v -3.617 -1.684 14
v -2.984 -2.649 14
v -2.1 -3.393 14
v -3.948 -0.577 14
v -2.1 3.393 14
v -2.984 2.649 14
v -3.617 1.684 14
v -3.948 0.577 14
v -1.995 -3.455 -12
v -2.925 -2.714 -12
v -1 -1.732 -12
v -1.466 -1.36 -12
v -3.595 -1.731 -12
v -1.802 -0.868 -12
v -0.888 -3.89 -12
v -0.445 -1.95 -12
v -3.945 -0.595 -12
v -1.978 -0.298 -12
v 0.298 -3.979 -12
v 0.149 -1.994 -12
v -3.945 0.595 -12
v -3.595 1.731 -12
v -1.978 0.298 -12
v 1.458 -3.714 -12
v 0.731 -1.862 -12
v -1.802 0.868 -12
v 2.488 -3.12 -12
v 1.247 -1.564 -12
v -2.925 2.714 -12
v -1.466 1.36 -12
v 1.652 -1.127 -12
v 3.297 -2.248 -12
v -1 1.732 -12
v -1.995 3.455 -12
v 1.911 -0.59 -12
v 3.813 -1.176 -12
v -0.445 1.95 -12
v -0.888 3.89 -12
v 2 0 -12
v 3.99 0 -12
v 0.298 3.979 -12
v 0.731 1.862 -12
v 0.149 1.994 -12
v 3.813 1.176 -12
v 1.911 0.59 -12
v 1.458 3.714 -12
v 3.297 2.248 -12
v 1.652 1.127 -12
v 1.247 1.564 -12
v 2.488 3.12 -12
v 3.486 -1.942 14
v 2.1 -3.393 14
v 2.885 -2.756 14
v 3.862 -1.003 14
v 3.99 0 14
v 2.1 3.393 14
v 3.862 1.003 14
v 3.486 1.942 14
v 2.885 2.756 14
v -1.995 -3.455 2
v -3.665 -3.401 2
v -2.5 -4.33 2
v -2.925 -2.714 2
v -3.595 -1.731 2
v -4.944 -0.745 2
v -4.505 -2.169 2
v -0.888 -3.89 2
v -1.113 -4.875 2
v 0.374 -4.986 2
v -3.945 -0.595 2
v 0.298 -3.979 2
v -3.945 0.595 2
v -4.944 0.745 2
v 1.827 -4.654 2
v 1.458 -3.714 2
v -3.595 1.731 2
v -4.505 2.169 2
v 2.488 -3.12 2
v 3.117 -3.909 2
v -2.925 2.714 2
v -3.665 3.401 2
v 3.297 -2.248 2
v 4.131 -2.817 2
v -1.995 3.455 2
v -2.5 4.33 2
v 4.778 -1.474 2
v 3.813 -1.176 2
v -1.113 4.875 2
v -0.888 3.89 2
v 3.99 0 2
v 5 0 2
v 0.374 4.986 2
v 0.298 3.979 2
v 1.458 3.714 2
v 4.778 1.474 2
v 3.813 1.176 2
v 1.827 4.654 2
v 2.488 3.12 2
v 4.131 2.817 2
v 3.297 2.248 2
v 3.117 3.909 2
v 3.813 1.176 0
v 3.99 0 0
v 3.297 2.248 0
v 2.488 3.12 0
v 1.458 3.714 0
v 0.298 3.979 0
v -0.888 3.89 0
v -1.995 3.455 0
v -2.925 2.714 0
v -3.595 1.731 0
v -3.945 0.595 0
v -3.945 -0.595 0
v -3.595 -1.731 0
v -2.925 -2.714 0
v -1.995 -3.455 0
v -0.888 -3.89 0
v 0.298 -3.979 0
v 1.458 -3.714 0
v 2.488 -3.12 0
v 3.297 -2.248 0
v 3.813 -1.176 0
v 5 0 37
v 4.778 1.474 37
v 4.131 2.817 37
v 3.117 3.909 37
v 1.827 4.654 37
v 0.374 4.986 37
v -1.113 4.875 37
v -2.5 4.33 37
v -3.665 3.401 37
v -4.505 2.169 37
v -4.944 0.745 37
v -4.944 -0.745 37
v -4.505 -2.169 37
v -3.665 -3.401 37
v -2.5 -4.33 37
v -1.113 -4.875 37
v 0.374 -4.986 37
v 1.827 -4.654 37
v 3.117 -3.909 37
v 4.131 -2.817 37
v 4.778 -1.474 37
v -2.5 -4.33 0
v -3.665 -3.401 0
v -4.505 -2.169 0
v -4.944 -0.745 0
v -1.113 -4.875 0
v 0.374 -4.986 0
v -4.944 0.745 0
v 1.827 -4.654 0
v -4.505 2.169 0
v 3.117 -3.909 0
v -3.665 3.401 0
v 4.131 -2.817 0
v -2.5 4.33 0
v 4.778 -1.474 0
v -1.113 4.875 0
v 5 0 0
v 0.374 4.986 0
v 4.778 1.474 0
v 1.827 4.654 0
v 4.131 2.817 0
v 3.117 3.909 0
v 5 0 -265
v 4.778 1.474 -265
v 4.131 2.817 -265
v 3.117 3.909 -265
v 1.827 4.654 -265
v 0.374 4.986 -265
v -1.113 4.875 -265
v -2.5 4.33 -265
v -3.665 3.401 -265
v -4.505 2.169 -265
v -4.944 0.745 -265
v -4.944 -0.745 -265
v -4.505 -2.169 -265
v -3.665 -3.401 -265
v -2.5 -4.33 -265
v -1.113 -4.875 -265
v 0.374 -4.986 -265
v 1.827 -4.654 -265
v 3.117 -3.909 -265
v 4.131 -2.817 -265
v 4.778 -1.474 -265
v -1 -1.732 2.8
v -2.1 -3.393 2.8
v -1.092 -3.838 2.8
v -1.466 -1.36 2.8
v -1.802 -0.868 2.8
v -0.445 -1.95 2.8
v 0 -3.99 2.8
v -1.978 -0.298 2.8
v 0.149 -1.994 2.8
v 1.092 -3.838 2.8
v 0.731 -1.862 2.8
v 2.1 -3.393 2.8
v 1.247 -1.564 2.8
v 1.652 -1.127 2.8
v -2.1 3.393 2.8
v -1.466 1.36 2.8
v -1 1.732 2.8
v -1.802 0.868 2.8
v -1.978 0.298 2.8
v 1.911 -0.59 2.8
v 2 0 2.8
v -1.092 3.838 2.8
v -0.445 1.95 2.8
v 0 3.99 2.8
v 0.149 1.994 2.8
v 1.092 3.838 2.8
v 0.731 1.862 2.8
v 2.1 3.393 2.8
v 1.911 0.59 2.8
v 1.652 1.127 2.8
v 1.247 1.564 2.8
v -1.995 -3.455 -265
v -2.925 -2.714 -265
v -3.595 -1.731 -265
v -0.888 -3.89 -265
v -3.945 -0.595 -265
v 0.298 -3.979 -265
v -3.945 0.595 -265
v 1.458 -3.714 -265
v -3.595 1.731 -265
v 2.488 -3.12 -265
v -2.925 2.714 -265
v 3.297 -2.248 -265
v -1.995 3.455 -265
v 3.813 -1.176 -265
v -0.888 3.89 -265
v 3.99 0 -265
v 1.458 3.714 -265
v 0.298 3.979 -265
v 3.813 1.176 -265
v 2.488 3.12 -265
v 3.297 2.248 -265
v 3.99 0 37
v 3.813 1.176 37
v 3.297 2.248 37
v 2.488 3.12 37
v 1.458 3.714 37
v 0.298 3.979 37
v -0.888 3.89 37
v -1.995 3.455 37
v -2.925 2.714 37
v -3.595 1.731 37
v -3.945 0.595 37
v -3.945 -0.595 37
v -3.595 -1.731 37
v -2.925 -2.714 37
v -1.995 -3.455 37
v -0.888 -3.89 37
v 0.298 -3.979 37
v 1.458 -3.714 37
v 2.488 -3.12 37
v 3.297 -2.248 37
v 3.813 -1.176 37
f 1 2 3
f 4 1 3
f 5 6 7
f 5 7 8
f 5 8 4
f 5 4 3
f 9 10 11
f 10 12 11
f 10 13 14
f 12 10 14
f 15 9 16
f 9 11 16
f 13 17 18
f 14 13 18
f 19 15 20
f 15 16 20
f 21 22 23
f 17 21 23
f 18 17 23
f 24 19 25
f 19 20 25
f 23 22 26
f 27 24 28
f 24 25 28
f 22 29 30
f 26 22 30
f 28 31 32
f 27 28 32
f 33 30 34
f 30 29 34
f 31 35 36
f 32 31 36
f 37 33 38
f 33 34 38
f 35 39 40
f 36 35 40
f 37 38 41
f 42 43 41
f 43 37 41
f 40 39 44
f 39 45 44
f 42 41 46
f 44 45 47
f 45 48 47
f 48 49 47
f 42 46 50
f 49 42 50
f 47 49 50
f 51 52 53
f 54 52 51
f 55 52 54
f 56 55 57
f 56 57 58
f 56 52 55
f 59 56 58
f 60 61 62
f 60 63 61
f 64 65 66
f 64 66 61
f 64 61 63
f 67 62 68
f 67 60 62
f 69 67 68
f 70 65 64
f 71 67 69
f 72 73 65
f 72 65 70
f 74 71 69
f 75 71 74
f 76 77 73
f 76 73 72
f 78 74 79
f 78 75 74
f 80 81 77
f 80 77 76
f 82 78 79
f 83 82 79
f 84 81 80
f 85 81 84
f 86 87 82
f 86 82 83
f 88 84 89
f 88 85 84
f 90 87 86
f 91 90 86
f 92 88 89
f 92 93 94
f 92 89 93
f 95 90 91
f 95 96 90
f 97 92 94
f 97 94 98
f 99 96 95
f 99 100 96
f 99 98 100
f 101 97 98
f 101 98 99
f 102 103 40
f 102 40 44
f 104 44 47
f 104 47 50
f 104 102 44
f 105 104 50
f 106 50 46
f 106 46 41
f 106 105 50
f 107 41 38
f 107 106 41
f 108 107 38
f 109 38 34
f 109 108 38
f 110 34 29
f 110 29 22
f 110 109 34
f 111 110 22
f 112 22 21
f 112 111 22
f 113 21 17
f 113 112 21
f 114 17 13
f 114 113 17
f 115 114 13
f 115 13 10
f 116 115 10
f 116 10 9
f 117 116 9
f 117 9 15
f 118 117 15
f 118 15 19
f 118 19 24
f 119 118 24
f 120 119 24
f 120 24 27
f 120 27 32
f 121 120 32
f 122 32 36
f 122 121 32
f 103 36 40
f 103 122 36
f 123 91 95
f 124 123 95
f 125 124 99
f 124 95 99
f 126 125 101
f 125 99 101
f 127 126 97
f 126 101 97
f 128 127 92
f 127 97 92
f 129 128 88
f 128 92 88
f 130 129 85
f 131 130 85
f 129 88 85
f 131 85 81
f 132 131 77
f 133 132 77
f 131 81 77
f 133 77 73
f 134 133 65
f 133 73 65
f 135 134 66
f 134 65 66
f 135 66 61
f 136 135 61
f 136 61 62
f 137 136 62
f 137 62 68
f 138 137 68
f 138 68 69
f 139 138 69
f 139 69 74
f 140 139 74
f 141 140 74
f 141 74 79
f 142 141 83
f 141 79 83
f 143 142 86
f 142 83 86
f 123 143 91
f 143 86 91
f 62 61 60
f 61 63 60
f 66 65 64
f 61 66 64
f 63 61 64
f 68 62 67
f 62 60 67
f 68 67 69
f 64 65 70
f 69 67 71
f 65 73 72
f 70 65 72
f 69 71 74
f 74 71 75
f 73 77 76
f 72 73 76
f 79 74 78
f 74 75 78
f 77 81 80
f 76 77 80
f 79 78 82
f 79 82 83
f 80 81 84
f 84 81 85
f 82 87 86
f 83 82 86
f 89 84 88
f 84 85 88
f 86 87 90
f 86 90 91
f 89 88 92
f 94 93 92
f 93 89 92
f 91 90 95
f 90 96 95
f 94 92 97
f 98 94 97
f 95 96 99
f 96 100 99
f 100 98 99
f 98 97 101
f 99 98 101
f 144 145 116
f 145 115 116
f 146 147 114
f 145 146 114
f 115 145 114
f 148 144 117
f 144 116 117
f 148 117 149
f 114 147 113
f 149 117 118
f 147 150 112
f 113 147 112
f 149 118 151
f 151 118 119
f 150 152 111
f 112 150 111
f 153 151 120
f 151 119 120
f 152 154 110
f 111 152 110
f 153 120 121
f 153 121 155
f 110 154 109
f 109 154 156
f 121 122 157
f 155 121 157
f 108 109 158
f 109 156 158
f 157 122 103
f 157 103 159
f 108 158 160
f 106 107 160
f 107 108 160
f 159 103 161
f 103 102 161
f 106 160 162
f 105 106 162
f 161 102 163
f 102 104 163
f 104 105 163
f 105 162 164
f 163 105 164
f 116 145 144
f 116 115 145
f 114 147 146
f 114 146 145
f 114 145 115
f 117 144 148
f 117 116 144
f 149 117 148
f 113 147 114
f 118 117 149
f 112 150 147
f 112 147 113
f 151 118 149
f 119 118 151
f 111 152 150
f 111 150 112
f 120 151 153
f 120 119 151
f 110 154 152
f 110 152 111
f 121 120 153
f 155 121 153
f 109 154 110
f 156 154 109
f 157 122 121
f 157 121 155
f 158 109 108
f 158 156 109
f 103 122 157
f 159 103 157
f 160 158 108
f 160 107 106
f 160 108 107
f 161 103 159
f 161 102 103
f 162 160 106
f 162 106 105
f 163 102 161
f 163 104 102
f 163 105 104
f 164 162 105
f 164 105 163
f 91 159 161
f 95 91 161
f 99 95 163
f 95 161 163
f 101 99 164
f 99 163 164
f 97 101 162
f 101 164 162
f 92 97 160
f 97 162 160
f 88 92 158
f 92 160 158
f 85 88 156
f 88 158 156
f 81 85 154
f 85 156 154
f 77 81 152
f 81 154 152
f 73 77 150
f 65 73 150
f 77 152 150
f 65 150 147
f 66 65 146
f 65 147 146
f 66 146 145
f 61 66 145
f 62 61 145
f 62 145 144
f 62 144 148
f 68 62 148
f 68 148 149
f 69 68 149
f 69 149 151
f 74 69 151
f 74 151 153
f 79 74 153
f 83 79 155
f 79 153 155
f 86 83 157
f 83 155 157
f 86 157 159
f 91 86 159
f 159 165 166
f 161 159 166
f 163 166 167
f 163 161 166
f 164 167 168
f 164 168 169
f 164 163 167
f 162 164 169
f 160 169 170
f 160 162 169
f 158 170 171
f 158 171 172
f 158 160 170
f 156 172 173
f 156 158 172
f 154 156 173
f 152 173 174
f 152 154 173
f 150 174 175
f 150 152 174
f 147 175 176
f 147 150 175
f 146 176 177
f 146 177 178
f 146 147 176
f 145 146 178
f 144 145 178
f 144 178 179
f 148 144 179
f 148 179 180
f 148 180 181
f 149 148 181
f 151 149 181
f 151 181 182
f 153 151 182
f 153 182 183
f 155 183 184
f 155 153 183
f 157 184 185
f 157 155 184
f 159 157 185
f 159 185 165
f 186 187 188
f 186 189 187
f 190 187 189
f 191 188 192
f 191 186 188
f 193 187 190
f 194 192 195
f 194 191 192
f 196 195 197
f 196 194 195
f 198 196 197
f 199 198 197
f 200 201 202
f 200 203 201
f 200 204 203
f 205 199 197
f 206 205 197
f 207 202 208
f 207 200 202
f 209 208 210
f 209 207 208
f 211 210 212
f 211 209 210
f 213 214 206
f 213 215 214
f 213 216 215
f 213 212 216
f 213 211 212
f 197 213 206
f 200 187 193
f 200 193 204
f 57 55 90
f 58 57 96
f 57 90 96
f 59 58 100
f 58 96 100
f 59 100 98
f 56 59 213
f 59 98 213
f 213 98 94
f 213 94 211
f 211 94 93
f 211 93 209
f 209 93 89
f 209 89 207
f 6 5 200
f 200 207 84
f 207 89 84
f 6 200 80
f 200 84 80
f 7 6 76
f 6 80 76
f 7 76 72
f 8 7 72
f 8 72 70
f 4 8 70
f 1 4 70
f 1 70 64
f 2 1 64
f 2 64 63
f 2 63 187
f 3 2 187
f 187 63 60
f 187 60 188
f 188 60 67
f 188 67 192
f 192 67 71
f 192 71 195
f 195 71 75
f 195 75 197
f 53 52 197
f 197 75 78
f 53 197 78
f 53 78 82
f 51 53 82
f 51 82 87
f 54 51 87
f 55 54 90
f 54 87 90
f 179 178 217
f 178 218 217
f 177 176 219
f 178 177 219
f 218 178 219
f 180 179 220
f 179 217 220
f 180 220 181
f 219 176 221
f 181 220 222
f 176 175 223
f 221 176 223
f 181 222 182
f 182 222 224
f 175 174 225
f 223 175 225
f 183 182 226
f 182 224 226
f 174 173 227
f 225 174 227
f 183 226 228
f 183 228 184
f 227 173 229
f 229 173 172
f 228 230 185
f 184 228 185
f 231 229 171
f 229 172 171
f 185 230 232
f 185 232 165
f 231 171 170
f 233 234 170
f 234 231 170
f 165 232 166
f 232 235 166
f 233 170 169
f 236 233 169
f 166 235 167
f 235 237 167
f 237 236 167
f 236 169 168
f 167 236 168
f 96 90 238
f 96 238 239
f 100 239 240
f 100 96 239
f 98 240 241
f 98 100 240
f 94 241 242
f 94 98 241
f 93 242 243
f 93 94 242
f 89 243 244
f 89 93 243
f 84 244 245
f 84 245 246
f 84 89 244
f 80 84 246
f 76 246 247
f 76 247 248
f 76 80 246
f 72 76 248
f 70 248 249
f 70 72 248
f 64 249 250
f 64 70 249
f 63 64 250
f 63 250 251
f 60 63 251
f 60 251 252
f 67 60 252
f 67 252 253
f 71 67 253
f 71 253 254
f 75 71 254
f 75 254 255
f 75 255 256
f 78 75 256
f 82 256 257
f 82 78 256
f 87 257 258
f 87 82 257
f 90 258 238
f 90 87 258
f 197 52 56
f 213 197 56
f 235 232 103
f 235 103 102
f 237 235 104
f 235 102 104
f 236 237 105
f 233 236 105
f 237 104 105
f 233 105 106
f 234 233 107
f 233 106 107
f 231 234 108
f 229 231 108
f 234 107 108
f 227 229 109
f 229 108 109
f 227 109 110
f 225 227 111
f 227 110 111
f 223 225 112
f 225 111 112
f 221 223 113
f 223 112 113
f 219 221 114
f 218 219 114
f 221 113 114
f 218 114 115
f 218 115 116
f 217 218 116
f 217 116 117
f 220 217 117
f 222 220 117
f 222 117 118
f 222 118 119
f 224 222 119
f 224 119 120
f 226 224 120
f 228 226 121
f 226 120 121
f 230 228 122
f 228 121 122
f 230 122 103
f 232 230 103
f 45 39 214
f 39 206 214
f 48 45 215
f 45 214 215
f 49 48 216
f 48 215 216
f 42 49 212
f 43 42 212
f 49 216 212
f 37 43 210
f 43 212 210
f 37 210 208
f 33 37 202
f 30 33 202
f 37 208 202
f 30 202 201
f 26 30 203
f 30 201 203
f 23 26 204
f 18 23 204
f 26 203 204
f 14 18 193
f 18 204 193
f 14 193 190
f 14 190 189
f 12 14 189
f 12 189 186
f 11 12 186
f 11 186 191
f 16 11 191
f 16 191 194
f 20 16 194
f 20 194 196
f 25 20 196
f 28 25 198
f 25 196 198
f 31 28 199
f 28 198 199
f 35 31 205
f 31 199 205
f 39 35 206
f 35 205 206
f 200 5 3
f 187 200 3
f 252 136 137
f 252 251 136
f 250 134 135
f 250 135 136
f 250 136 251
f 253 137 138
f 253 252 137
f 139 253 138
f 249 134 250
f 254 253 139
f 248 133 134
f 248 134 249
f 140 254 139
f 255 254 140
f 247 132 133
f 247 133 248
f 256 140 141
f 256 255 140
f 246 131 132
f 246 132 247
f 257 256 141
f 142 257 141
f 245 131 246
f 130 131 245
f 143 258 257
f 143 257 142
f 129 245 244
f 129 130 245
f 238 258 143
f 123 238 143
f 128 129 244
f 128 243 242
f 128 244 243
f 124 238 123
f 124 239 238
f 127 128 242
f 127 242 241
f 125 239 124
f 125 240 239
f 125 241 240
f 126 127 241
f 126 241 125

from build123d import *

# Parameters (mm, degrees)
F0_R     = 3.99
F0_R_2   = 2
F1_DEPTH = 14
F2_R     = 2
F3_DEPTH = 11.2
F0_R_3   = 5
F4_DEPTH = 2
F5_DEPTH = 12
F6_DEPTH = 35
F7_DEPTH = 265


# Not quite as in the source:
# - a feature names something its author has since deleted; it is built from what else it names


with BuildPart() as f1:
    # F0 (on Top) → F1 (new body)
    with BuildSketch(Plane.XY):
        Circle(F0_R)
        Circle(F0_R_2, mode=Mode.SUBTRACT)
    extrude(amount=F1_DEPTH)

    # F2 (on face) → F3 (cut)
    with BuildSketch(Plane.XY.offset(14)):
        with BuildLine():
            ThreePointArc((-2.1, 3.3926538285), (0, 3.99), (2.1, 3.3926538285))
            Line((2.1, 3.3926538285), (2.1, 5))
            Line((2.1, 5), (-2.1, 5))
            Line((-2.1, 5), (-2.1, 3.3926538285))
        make_face()
        with BuildLine():
            Line((2.1, -3.3926538285), (2.1, 3.3926538285))
            ThreePointArc((2.1, 3.3926538285), (0, 3.99), (-2.1, 3.3926538285))
            Line((-2.1, 3.3926538285), (-2.1, -3.3926538285))
            ThreePointArc((-2.1, -3.3926538285), (0, -3.99), (2.1, -3.3926538285))
        make_face()
        Circle(F2_R, mode=Mode.SUBTRACT)
        with BuildLine():
            Line((2.1, -5), (2.1, -3.3926538285))
            ThreePointArc((2.1, -3.3926538285), (0, -3.99), (-2.1, -3.3926538285))
            Line((-2.1, -3.3926538285), (-2.1, -5))
            Line((-2.1, -5), (2.1, -5))
        make_face()
    extrude(amount=-F3_DEPTH, mode=Mode.SUBTRACT)

    # F0 (on Top) → F4 (join)
    with BuildSketch(Plane.XY):
        Circle(F0_R_3)
        Circle(F0_R, mode=Mode.SUBTRACT)
    extrude(amount=F4_DEPTH)

    # F0 (on Top) → F5 (join)
    with BuildSketch(Plane.XY):
        Circle(F0_R)
        Circle(F0_R_2, mode=Mode.SUBTRACT)
    extrude(amount=-F5_DEPTH)


with BuildPart() as f6:
    # F6 (new): a face of the model
    f6_faces = [f1.part.faces().sort_by_distance(p)[0] for p in [
        (-4.8585786438, 0, 2),
    ]]
    extrude(f6_faces, amount=F6_DEPTH)


with BuildPart() as f7:
    # F7 (new): a face of the model
    f7_faces = [f1.part.faces().sort_by_distance(p)[0] for p in [
        (-4.8585786438, 0, 0),
    ]]
    extrude(f7_faces, amount=F7_DEPTH)


solid = Compound([f1.part, f6.part, f7.part])
